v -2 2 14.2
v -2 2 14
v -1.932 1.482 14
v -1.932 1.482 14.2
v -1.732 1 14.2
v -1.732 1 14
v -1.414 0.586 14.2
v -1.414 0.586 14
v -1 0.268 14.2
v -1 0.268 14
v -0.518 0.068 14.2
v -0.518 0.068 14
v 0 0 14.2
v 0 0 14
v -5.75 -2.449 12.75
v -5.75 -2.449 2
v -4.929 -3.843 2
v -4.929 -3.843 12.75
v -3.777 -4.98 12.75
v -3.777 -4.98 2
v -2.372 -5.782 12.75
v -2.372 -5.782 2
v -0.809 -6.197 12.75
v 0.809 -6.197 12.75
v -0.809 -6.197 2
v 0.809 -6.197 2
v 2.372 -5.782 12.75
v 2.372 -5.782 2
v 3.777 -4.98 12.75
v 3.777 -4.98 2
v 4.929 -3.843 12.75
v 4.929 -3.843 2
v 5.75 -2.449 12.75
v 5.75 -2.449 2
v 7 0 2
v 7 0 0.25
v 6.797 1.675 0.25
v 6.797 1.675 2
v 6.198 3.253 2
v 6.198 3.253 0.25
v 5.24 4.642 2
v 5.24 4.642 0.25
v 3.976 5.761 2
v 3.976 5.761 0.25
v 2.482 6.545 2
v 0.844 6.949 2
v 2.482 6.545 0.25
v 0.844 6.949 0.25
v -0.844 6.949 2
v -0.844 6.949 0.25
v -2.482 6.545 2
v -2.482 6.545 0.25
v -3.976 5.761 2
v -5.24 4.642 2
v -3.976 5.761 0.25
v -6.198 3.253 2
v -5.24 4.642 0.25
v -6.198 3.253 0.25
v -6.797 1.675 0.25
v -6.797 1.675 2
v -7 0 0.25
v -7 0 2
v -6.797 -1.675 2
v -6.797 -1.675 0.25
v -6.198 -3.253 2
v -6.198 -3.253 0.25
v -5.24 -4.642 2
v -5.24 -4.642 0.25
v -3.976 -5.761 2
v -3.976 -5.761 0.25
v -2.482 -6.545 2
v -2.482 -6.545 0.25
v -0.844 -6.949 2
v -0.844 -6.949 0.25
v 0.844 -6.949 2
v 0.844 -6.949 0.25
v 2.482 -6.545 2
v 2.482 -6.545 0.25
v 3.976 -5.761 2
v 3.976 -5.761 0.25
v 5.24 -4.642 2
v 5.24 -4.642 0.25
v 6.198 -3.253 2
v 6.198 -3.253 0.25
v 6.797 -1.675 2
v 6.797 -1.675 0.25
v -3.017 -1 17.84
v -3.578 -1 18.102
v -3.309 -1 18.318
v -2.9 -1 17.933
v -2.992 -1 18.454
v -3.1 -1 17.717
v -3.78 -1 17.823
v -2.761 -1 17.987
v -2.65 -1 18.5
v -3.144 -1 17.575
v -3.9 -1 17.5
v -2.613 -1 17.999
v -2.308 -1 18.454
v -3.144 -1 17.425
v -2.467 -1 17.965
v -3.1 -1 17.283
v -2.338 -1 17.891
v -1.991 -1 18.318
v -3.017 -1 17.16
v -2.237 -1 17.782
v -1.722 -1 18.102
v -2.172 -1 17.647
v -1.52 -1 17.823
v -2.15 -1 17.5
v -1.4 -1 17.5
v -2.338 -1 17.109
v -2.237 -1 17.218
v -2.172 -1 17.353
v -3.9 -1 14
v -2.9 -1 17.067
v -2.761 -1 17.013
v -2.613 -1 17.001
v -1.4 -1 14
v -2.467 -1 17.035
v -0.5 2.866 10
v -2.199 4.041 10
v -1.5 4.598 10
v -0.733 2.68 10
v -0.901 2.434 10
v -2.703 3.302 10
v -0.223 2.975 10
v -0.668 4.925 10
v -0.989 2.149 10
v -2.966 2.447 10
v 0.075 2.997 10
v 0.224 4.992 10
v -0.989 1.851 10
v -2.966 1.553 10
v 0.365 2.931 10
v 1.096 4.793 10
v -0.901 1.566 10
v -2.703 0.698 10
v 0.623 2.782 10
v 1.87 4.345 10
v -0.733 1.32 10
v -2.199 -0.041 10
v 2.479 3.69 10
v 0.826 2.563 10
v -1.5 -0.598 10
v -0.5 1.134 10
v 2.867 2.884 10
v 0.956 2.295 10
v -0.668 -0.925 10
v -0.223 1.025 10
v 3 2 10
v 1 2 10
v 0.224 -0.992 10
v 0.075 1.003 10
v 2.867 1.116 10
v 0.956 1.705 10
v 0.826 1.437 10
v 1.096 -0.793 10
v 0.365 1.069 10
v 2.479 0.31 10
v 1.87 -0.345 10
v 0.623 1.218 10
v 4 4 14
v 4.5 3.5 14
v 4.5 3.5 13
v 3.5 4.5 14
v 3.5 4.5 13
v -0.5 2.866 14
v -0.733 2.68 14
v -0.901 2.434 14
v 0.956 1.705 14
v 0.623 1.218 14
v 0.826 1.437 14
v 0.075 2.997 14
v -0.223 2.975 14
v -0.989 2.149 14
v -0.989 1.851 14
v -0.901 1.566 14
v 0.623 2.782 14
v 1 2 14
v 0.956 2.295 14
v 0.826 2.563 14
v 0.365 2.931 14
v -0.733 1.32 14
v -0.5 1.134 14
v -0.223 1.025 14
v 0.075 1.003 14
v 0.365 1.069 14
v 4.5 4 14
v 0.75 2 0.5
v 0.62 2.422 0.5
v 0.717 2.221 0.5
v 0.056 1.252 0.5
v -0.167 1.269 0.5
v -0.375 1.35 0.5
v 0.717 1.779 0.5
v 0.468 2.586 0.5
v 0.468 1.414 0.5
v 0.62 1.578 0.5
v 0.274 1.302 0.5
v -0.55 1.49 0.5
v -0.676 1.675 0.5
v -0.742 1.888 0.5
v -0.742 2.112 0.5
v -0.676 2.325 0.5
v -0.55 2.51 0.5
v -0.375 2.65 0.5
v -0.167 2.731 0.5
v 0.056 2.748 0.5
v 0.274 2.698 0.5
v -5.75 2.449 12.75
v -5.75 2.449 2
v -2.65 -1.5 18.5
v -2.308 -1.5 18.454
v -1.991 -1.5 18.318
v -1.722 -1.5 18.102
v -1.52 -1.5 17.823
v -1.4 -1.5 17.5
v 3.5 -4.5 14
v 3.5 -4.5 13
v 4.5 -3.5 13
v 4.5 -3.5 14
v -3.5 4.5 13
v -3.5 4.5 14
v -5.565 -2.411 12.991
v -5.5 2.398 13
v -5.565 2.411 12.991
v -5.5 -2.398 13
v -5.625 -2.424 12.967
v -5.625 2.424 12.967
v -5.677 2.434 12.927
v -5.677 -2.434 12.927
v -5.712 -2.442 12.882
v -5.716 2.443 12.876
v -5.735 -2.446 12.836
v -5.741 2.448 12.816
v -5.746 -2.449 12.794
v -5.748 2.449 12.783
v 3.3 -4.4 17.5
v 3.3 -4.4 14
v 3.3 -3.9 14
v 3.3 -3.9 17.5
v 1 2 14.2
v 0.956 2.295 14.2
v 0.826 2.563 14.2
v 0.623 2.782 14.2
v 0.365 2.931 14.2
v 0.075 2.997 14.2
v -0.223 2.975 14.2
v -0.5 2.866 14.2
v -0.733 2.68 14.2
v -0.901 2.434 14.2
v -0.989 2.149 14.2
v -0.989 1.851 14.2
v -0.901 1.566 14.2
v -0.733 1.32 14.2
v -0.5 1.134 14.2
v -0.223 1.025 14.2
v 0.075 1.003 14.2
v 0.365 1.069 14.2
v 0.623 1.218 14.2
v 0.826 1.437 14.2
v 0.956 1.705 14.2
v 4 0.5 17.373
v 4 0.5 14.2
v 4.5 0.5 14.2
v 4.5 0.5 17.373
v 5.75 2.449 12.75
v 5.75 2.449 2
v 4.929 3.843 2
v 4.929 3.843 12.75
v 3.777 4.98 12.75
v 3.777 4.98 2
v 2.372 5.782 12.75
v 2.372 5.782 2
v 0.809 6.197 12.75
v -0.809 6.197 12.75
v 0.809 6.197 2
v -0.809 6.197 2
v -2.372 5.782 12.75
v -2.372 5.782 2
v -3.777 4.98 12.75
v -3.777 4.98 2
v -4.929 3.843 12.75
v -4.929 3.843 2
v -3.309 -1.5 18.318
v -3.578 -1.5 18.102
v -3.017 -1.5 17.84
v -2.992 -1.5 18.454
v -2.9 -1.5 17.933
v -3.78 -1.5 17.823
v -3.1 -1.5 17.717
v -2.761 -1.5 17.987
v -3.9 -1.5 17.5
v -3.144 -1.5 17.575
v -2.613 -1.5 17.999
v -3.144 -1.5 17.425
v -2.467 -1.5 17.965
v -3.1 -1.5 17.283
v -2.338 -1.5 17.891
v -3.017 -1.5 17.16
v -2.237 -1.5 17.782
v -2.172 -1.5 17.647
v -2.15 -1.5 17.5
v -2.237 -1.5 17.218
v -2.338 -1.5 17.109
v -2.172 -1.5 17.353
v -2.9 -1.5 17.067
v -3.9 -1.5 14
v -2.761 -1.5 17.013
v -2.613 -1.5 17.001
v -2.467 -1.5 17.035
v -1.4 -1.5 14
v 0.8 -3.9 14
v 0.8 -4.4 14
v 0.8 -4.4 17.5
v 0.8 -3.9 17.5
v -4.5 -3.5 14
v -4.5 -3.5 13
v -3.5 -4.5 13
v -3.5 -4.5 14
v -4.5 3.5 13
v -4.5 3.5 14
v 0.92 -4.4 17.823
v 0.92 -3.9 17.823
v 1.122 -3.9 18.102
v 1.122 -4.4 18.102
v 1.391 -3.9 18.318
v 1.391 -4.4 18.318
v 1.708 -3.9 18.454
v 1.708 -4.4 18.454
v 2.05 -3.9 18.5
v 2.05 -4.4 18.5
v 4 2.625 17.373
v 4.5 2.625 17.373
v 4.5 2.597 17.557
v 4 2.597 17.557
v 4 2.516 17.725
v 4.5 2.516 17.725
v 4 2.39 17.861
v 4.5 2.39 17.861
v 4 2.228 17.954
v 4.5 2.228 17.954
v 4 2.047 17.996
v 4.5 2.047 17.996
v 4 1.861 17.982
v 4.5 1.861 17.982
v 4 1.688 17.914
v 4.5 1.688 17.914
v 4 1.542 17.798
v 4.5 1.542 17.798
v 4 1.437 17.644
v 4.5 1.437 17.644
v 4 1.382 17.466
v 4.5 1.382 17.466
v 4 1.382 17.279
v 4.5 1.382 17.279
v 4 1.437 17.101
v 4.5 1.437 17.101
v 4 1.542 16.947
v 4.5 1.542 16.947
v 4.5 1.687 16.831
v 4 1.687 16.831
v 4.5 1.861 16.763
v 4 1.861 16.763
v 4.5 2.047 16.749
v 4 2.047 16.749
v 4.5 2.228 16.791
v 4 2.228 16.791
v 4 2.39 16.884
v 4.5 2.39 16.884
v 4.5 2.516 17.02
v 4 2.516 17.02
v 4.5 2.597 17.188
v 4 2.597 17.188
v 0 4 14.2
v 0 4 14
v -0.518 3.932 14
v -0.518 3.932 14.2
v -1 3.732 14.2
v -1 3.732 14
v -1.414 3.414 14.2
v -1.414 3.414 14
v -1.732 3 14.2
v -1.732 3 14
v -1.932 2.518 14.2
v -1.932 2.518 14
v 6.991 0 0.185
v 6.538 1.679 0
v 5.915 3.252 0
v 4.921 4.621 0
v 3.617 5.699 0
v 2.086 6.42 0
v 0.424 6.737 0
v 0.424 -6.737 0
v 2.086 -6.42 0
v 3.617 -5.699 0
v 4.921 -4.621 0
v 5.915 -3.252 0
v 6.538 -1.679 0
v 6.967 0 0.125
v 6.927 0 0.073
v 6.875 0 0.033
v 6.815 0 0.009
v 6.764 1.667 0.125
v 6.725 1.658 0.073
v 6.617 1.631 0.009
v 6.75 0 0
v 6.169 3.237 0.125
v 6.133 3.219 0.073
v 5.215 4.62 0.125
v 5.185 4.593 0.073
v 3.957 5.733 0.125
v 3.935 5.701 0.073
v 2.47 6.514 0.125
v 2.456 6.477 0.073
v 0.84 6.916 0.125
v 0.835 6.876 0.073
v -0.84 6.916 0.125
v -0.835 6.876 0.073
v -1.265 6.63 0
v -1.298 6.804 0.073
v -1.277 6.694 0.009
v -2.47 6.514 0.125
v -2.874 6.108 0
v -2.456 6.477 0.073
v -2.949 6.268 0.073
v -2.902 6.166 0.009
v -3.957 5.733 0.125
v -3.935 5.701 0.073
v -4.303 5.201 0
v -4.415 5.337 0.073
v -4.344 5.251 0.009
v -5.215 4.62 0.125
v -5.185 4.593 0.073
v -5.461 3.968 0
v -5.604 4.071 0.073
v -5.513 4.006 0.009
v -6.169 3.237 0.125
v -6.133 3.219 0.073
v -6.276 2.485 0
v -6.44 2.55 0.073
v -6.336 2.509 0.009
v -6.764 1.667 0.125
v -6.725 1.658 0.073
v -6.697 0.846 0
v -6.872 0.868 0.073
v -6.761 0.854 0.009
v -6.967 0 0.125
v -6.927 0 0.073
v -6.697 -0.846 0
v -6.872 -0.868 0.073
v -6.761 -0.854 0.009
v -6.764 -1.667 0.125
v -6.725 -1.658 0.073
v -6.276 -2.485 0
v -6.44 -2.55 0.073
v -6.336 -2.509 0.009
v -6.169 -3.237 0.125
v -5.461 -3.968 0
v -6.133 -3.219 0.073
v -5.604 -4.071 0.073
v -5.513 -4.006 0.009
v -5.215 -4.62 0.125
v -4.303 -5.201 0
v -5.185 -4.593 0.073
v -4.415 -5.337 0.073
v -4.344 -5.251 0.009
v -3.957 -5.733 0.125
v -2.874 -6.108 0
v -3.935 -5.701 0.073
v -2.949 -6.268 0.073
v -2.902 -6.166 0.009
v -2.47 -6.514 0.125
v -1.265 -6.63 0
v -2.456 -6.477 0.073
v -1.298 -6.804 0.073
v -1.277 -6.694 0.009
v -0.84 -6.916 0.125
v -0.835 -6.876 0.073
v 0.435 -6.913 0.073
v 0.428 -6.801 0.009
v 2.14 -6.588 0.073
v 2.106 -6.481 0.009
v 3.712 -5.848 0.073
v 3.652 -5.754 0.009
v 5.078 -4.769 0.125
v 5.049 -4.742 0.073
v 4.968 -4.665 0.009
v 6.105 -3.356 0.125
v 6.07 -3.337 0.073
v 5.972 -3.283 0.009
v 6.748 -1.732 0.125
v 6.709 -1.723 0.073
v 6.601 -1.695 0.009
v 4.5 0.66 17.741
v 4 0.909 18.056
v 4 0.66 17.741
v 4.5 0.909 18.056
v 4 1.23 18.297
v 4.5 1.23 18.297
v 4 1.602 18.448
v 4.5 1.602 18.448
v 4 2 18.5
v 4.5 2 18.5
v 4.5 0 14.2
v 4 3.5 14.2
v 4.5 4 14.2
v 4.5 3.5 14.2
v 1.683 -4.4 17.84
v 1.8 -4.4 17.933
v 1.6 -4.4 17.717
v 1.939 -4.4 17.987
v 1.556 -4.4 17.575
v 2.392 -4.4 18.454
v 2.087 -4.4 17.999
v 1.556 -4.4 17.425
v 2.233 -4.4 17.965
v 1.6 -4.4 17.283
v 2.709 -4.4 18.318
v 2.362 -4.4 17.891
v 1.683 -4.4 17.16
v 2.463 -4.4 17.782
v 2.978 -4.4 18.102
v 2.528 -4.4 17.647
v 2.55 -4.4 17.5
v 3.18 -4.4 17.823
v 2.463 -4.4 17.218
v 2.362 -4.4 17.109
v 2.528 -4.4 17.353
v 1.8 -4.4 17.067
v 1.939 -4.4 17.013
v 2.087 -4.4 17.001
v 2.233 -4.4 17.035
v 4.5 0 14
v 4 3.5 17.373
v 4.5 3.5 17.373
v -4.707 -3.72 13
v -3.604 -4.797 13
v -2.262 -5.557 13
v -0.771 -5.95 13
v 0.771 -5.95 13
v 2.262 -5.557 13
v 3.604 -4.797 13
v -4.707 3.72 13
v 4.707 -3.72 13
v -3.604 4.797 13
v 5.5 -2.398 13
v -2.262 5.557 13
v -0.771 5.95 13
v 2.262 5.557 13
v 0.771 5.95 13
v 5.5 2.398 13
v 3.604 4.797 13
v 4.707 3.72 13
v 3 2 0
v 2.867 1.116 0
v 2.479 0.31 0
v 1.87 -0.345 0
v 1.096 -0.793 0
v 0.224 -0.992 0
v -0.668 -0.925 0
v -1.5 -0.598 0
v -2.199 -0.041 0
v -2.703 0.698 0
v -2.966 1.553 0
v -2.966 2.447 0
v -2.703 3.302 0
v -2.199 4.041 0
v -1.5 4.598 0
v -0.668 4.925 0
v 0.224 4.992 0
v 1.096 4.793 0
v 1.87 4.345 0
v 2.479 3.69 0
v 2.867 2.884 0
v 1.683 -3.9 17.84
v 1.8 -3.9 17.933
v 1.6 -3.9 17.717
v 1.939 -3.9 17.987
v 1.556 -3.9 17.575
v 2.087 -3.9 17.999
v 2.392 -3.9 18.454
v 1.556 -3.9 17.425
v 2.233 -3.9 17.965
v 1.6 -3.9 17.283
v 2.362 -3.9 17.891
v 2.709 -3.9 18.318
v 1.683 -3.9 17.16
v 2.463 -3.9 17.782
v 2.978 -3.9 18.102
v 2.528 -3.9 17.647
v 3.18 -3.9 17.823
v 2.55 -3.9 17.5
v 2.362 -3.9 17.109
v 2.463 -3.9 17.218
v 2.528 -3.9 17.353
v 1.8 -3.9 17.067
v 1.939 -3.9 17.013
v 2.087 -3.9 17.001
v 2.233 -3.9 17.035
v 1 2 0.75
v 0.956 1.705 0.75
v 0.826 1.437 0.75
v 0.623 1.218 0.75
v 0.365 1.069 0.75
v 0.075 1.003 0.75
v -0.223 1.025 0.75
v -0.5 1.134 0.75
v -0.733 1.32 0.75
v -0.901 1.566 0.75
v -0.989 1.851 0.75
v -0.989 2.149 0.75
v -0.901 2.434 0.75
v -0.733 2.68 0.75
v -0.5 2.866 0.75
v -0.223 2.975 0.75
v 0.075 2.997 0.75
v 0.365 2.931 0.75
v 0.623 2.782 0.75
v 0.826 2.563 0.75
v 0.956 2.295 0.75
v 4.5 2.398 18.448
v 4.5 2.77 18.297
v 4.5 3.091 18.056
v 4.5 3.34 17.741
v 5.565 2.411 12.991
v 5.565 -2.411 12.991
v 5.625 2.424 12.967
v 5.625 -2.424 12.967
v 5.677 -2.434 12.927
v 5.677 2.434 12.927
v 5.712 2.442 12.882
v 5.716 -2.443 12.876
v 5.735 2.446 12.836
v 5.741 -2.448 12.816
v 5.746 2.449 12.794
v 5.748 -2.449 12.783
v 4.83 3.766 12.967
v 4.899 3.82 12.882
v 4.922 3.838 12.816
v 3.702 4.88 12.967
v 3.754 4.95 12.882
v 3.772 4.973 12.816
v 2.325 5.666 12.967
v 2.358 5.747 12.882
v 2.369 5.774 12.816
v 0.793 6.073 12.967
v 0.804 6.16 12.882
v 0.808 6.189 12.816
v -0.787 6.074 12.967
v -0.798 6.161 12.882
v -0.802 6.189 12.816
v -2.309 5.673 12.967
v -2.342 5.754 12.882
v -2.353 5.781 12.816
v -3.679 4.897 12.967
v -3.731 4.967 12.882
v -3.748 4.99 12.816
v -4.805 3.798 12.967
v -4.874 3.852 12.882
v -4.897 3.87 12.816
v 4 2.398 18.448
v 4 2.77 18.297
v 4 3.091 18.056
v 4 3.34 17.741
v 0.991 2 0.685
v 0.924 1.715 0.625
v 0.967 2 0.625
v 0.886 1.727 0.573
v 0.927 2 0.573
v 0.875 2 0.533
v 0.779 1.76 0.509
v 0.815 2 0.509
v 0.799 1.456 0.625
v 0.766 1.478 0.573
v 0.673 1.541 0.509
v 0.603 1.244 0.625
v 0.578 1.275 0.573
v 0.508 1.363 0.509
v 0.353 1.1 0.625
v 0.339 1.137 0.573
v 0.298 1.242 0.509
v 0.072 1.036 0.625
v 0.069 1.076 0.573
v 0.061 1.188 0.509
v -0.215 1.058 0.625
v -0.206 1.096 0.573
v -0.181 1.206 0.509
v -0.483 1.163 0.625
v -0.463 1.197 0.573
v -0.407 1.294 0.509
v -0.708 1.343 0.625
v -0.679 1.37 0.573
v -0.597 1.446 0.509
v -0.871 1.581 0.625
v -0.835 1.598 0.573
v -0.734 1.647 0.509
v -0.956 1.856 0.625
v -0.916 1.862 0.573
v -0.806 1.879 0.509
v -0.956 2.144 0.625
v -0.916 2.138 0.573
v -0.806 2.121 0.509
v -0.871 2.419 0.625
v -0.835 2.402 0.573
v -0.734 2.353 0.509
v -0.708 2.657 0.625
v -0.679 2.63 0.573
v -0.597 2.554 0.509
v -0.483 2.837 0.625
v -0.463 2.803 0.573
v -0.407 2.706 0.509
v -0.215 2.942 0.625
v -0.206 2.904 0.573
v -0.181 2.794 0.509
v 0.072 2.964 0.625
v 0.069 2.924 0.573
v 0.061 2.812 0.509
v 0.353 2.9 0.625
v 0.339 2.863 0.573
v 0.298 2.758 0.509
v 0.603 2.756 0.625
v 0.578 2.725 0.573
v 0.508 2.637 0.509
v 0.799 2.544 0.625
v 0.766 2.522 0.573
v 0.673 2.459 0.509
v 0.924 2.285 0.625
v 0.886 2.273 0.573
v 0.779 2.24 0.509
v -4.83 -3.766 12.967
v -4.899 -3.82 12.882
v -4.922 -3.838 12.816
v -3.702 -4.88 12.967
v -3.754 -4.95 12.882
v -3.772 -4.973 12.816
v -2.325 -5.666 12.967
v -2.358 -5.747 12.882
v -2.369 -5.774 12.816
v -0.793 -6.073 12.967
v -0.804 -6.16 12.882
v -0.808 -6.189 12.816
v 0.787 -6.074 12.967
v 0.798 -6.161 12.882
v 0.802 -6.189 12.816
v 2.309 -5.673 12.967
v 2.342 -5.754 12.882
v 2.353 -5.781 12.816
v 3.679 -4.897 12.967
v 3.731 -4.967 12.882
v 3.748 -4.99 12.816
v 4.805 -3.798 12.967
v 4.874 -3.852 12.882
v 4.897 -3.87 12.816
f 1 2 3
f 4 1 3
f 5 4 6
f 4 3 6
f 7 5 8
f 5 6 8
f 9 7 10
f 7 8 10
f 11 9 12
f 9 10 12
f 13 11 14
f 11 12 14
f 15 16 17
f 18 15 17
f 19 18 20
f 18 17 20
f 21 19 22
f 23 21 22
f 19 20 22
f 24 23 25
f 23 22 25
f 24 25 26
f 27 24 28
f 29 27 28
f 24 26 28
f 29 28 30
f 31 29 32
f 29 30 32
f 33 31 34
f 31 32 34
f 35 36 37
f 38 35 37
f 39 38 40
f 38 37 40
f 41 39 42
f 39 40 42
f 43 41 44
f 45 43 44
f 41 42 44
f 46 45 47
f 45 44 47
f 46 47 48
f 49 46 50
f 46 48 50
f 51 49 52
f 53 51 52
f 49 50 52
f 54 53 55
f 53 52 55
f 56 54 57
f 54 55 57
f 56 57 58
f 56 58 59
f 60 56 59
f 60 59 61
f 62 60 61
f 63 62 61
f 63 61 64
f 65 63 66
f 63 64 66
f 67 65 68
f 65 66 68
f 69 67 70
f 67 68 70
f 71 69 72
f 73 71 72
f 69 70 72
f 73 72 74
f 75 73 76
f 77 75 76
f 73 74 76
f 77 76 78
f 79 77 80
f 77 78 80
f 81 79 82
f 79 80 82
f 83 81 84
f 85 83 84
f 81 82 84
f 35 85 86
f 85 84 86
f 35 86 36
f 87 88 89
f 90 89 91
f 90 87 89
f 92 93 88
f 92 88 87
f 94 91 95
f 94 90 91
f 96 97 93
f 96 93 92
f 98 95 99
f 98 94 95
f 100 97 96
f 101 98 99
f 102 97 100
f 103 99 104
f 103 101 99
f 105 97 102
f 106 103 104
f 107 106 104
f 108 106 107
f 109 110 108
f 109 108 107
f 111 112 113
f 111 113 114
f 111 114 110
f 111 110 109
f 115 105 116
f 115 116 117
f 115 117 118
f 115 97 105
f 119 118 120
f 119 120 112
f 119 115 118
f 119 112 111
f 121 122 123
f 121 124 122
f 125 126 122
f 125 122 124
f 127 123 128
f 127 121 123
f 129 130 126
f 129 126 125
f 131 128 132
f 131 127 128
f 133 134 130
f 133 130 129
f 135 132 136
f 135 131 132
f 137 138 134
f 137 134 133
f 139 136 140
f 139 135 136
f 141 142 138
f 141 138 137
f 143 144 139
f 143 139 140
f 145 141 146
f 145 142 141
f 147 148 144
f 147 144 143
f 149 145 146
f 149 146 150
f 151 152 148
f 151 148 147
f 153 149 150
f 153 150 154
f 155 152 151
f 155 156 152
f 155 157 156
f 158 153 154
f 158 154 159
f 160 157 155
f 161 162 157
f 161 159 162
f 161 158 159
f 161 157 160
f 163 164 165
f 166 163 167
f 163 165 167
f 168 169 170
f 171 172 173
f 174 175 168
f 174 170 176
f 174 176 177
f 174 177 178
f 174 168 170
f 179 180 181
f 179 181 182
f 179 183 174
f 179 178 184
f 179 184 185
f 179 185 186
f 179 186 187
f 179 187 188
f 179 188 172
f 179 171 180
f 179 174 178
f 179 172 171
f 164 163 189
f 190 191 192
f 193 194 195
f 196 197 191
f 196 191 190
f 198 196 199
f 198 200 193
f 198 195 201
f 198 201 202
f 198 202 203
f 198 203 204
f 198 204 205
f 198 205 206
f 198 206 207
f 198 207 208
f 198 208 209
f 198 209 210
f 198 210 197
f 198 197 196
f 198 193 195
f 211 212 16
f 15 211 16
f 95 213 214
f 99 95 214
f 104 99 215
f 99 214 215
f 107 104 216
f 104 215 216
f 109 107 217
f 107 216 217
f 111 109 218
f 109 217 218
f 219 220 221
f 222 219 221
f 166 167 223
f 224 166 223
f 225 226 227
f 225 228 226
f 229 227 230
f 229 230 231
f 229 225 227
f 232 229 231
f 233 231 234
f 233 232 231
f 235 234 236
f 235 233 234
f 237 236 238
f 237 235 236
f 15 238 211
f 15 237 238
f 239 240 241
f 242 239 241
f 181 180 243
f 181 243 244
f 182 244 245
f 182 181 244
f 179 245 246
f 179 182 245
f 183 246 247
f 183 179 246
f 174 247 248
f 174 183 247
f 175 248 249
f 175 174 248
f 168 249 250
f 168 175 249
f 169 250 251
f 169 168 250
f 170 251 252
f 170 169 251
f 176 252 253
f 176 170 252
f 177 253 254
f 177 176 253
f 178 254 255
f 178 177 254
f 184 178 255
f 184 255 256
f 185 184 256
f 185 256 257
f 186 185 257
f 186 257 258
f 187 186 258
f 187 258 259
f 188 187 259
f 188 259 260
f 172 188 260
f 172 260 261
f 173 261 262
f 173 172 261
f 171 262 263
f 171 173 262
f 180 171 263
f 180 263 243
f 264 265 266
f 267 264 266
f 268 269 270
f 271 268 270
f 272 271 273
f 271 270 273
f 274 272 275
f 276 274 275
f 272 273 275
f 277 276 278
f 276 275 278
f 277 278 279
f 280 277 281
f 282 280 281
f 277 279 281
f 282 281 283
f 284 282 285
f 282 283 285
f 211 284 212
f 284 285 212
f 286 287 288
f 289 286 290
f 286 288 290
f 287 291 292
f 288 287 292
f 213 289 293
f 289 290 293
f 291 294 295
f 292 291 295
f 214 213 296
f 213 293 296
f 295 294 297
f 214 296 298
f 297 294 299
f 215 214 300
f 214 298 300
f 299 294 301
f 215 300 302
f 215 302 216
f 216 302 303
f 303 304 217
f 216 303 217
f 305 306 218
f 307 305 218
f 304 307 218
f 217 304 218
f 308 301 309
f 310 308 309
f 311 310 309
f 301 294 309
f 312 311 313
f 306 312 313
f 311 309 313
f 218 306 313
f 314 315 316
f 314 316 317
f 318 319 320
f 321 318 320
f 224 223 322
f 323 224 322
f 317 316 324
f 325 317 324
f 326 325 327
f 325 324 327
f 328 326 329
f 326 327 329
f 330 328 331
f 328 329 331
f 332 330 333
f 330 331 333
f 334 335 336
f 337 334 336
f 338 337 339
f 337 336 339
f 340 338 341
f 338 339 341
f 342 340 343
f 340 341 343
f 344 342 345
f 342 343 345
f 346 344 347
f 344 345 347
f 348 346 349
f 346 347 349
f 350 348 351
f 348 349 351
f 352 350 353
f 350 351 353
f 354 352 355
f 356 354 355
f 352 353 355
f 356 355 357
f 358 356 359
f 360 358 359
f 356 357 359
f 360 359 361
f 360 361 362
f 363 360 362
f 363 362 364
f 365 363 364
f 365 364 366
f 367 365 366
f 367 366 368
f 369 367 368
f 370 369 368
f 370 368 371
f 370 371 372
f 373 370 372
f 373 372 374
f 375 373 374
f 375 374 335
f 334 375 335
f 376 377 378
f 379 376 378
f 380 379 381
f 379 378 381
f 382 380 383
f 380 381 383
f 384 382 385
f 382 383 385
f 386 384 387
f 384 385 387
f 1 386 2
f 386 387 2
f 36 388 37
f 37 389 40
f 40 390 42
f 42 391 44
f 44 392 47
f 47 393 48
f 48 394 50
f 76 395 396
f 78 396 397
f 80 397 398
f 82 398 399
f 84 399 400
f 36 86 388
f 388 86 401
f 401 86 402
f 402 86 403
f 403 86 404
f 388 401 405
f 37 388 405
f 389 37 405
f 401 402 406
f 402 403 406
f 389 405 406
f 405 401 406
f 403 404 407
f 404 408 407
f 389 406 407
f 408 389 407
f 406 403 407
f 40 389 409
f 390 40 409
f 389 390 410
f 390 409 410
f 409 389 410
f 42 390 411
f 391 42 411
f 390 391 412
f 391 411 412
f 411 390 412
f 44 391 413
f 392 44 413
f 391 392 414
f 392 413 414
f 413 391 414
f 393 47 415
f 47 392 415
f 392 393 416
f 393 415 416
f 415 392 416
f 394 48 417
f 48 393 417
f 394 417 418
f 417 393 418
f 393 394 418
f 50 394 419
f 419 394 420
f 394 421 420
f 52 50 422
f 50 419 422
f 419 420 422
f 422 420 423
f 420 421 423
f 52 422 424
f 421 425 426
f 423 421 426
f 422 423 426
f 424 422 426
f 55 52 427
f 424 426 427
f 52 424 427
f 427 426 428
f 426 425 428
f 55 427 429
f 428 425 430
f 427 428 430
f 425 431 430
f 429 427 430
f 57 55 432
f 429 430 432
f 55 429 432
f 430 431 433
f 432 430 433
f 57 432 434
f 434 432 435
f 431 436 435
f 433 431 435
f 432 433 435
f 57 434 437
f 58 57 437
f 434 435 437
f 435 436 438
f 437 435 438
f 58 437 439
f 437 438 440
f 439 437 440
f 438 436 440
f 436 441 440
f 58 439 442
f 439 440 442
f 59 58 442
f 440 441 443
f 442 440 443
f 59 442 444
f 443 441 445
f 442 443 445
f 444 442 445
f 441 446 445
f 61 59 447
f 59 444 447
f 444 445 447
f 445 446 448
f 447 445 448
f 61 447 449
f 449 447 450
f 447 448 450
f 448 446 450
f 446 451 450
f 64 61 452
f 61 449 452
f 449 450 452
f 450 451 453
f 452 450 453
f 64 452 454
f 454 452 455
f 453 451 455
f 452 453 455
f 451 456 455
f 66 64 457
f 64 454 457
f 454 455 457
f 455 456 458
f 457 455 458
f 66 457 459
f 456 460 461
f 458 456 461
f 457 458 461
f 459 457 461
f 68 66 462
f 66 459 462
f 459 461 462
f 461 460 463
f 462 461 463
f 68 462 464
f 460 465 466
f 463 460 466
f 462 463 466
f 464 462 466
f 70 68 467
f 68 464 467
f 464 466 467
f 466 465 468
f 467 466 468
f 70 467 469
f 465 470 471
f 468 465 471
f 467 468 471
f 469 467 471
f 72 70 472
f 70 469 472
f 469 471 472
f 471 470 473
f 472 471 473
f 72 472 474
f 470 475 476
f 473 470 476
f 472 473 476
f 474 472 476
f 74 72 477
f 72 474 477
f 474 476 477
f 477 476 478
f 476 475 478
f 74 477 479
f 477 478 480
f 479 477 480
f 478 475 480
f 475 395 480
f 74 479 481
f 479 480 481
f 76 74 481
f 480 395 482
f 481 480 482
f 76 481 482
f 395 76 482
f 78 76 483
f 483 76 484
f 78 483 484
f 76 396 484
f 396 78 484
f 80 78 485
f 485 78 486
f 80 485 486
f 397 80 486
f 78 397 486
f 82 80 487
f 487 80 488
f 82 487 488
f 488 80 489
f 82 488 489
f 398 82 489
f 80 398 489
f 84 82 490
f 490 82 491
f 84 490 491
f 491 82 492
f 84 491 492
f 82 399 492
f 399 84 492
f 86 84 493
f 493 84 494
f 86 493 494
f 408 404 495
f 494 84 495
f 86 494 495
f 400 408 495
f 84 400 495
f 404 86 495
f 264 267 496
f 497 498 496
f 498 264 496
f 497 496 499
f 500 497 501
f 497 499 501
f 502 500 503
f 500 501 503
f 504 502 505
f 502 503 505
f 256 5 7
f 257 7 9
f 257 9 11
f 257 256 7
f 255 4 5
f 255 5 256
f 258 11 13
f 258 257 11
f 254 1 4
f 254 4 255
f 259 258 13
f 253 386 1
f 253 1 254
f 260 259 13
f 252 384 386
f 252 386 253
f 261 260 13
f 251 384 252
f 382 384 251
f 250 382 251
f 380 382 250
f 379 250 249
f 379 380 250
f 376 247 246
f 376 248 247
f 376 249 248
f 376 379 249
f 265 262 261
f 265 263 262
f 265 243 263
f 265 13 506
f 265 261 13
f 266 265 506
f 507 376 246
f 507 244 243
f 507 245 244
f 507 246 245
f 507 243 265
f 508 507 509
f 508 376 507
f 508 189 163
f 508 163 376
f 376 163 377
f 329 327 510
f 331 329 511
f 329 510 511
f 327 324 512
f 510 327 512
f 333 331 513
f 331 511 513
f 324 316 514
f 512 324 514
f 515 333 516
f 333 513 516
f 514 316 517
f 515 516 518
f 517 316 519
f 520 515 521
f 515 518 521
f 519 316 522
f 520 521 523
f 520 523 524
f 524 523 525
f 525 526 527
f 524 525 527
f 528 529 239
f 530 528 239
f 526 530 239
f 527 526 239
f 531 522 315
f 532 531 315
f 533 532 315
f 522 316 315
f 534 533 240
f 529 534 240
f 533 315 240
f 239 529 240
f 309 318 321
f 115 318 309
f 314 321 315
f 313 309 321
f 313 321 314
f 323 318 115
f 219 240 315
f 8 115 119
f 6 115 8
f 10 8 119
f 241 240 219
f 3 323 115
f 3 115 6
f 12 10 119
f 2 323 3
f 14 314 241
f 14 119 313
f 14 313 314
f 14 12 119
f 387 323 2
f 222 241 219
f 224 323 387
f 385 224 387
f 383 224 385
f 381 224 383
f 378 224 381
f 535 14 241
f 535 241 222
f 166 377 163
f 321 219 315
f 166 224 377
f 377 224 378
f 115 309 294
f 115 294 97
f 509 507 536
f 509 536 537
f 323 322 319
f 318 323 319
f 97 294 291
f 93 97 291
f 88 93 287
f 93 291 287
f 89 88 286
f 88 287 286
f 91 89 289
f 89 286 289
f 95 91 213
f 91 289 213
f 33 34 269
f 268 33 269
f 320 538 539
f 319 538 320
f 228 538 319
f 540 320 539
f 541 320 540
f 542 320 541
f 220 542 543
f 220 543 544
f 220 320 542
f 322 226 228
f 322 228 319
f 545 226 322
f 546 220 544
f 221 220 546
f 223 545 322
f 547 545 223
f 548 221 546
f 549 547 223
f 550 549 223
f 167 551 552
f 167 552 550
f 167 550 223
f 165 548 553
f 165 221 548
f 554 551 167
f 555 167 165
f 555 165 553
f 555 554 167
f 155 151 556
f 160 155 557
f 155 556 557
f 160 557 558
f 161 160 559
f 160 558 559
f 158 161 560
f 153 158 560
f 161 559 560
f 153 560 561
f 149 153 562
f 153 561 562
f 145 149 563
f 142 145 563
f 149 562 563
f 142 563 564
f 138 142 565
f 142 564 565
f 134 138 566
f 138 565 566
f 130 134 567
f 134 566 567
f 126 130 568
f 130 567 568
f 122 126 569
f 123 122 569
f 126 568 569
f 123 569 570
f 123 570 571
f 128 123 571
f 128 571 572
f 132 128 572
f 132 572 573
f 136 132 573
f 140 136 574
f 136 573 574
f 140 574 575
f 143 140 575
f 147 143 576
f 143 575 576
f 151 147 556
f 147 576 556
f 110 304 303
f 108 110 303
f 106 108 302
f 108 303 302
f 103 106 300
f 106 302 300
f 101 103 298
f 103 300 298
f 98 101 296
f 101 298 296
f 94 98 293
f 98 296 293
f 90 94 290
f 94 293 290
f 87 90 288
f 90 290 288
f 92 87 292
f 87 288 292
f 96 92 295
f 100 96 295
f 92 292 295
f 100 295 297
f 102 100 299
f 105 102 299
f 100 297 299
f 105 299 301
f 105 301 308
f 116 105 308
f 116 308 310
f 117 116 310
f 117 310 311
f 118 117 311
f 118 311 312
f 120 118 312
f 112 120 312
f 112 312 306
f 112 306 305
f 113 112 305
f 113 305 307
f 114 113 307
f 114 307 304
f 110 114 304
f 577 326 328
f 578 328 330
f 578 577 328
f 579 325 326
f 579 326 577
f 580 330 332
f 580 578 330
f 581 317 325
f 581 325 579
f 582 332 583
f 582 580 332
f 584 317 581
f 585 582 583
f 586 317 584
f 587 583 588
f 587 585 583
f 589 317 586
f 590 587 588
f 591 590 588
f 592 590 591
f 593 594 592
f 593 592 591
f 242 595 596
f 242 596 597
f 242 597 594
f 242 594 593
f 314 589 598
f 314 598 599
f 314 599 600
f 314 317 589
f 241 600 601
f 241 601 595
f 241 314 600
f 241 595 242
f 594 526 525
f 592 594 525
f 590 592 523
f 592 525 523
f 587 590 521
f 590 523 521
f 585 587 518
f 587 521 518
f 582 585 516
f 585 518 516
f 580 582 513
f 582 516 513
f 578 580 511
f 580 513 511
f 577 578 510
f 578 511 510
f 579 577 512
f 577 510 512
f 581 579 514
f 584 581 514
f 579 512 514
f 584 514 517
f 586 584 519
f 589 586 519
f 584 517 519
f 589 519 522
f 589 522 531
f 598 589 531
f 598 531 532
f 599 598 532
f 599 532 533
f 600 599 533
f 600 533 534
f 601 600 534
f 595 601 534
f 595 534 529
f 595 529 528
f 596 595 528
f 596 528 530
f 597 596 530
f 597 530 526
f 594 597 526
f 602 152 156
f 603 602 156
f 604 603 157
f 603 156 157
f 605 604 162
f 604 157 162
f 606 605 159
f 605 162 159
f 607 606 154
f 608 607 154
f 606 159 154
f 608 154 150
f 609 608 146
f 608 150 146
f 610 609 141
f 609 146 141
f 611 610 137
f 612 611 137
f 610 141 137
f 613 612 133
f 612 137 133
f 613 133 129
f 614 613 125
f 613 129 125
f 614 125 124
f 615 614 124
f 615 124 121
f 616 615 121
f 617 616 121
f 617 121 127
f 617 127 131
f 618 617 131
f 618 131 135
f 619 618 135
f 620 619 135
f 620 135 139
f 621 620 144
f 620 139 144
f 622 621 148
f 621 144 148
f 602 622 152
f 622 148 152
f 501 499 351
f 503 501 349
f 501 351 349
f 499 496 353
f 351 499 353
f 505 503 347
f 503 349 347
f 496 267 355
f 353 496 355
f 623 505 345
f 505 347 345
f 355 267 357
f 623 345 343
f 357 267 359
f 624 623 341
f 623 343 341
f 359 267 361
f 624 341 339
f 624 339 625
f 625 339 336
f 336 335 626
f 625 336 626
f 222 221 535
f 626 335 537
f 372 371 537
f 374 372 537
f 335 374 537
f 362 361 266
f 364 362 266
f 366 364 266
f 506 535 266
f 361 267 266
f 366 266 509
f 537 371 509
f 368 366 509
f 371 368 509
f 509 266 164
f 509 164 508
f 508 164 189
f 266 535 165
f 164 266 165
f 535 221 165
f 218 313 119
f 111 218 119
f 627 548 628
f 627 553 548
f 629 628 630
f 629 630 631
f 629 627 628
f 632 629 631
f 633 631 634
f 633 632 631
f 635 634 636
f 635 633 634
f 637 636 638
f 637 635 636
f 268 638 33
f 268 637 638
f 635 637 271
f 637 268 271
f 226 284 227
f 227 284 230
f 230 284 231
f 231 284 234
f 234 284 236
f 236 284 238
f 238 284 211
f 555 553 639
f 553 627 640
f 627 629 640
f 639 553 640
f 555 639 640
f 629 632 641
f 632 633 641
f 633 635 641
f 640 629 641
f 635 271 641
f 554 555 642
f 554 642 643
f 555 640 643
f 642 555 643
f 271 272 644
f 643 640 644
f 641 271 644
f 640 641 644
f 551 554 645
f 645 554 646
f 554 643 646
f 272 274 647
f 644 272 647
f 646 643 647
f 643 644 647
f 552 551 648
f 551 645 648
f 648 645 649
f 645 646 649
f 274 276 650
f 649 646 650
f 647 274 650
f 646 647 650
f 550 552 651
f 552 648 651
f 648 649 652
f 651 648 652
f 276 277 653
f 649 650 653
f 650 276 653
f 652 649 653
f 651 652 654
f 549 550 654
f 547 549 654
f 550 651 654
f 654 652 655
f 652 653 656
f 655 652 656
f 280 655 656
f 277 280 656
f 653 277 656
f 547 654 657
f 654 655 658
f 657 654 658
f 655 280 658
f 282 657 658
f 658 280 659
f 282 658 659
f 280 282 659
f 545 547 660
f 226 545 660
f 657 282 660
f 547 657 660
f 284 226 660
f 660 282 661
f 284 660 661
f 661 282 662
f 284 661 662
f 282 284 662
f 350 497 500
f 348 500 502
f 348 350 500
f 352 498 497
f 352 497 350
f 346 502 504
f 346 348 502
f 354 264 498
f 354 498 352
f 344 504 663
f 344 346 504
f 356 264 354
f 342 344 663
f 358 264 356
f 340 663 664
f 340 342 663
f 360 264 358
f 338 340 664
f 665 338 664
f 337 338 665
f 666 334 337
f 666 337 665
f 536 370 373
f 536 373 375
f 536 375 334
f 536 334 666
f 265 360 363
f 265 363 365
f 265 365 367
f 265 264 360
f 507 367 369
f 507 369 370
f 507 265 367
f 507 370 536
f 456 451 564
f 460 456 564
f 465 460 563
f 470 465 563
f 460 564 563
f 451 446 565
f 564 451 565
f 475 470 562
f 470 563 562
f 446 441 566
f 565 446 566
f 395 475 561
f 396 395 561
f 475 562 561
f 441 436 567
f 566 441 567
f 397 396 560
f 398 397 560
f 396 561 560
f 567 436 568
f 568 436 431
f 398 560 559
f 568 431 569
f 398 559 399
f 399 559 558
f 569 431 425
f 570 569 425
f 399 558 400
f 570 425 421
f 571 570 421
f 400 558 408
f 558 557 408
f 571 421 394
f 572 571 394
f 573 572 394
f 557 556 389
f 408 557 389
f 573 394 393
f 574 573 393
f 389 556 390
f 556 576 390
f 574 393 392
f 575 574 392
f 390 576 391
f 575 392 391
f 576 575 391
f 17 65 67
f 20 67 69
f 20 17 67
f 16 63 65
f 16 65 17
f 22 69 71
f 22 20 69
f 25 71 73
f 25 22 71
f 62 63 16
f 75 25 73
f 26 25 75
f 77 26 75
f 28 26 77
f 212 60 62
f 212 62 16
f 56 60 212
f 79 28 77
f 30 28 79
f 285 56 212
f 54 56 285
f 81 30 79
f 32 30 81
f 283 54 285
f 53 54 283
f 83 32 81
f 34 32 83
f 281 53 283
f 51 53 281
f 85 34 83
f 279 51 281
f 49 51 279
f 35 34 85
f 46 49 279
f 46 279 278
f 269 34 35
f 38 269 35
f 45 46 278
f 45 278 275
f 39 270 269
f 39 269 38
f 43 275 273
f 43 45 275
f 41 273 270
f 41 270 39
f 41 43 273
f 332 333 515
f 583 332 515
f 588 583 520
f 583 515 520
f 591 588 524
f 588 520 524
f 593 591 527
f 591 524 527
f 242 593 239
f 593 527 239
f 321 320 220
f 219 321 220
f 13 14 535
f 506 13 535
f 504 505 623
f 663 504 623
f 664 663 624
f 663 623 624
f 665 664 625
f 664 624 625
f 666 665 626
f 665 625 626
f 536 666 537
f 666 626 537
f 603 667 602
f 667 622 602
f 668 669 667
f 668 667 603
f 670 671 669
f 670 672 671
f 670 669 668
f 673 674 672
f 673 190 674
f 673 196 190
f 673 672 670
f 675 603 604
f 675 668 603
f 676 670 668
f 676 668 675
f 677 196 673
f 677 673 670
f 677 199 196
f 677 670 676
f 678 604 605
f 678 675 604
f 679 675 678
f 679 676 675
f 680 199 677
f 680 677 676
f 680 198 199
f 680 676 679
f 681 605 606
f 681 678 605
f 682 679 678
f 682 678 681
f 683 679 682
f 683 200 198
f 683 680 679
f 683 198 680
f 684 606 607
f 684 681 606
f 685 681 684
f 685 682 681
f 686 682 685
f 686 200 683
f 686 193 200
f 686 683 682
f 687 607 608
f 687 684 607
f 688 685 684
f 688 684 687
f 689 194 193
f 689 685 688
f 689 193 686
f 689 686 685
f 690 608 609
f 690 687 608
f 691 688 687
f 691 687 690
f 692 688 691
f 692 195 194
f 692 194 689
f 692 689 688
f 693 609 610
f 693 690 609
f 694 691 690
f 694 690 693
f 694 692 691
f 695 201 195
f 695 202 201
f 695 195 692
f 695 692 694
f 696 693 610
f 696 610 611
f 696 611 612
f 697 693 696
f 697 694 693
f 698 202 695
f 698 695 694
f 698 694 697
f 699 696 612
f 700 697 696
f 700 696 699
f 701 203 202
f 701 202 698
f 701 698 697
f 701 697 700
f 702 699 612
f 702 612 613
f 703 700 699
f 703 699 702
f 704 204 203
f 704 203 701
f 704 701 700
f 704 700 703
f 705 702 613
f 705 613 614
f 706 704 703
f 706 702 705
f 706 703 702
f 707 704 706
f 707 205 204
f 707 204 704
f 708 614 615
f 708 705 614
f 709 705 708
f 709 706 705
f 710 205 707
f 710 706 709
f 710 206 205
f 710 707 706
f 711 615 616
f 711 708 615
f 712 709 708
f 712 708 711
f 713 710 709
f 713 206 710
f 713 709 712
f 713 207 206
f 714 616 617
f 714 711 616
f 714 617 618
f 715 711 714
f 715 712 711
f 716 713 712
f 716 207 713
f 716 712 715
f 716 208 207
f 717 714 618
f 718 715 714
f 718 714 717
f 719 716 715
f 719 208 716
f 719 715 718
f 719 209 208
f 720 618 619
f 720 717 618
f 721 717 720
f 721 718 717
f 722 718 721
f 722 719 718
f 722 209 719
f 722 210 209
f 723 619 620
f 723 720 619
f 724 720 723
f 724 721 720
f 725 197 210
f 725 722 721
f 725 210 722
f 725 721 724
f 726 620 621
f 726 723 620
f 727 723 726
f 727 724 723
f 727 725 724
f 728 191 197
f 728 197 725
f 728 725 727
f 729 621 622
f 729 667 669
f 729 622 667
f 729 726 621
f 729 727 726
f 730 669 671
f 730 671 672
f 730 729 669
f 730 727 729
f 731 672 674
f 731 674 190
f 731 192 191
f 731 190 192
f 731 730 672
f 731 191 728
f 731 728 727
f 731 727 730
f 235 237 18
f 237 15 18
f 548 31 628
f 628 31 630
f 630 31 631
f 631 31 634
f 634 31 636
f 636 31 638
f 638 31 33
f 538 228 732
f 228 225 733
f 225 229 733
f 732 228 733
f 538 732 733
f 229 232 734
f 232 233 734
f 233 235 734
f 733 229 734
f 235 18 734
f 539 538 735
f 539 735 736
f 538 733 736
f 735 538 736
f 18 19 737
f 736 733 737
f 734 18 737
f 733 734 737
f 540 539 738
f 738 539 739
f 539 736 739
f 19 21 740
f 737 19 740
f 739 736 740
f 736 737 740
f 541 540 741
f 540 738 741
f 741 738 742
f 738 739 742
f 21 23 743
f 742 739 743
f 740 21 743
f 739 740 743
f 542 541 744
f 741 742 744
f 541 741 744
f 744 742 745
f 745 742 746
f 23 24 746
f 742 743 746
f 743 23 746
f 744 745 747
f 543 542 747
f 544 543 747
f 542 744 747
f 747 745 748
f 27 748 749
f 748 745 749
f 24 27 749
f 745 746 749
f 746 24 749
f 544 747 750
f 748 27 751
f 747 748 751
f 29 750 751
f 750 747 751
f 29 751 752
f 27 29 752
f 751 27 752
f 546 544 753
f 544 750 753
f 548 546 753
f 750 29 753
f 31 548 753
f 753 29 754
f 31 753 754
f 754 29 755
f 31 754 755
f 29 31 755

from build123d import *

# Parameters (mm, degrees)
F0_R      = 7
F1_DEPTH  = 2
F3_DEPTH  = 11
F4_R      = 3
F5_DEPTH  = 10
F7_DEPTH  = 1
F8_R      = 1
F9_DEPTH  = 0.2
F10_W     = 0.5
F10_H     = 3
F10_W_2   = 2.5
F10_H_2   = 0.5
F11_DEPTH = 4.5
F12_R     = 0.625
F13_DEPTH = 25
F14_R     = 0.5
F15_DEPTH = 11.401
F16_R     = 1
F17_DEPTH = 9.5
F18_R     = 0.25


with BuildPart() as f1:
    # F0 (on Top) → F1 (new body)
    with BuildSketch(Plane.XY):
        Circle(F0_R)
    extrude(amount=F1_DEPTH)

    # F2 (on face) → F3 (join)
    with BuildSketch(Plane.XY.offset(2)):
        with BuildLine():
            Line((-5.75, 2.44949), (-5.75, -2.44949))
            ThreePointArc((-5.75, -2.44949), (0, -6.25), (5.75, -2.44949))
            Line((5.75, -2.44949), (5.75, 2.44949))
            ThreePointArc((5.75, 2.44949), (0, 6.25), (-5.75, 2.44949))
        make_face()
    extrude(amount=F3_DEPTH)

    # F4 (on face) → F5 (cut)
    with BuildSketch(Plane(origin=(0, 0, 0), x_dir=(1, 0, 0), z_dir=(0, 0, -1))):
        with Locations((0, -2)):
            Circle(F4_R)
    extrude(amount=-F5_DEPTH, mode=Mode.SUBTRACT)

    # F6 (on face) → F7 (join)
    with BuildSketch(Plane.XY.offset(13)):
        Polygon((-3.5, -4.5), (3.5, -4.5), (4.5, -3.5), (4.5, 3.5), (3.5, 4.5), (-3.5, 4.5), (-4.5, 3.5), (-4.5, -3.5), align=None)
    extrude(amount=F7_DEPTH)

    # F8 (on face) → F9 (join)
    with BuildSketch(Plane.XY.offset(14)):
        with BuildLine():
            Line((4.5, 0), (4.5, 4))
            Line((4.5, 4), (0, 4))
            ThreePointArc((0, 4), (-1.414214, 3.414214), (-2, 2))
            ThreePointArc((-2, 2), (-1.414214, 0.585786), (0, 0))
            Line((0, 0), (4.5, 0))
        make_face()
        with Locations((0, 2)):
            Circle(F8_R, mode=Mode.SUBTRACT)
    extrude(amount=F9_DEPTH)

    # F10 (on face) → F11 (join)
    with BuildSketch(Plane.XY.offset(14)):
        with Locations((4.25, 2)):
            Rectangle(F10_W, F10_H)
        with Locations((2.05, -4.15)):
            Rectangle(F10_W_2, F10_H_2)
        with Locations((-2.65, -1.25)):
            Rectangle(F10_W_2, F10_H_2)
    extrude(amount=F11_DEPTH)

    # F12 (on face) → F13 (cut)
    with BuildSketch(Plane.YZ.offset(4.5)):
        with Locations((2, 17.372569)):
            Circle(F12_R)
        with BuildLine():
            ThreePointArc((0.5, 17.372569), (1.06177, 18.186716), (2, 18.5))
            Line((2, 18.5), (0.5, 18.5))
            Line((0.5, 18.5), (0.5, 17.372569))
        make_face()
        with BuildLine():
            ThreePointArc((2, 18.5), (2.93823, 18.186716), (3.5, 17.372569))
            Line((3.5, 17.372569), (3.5, 18.5))
            Line((3.5, 18.5), (2, 18.5))
        make_face()
    extrude(amount=-F13_DEPTH, mode=Mode.SUBTRACT)

    # F14 (on face) → F15 (cut, through all)
    with BuildSketch(Plane.XZ.offset(4.4)):
        with Locations((2.05, 17.5)):
            Circle(F14_R)
        with BuildLine():
            ThreePointArc((2.05, 18.5), (2.850391, 18.219238), (3.3, 17.5))
            Line((3.3, 17.5), (3.3, 18.5))
            Line((3.3, 18.5), (2.05, 18.5))
        make_face()
        with BuildLine():
            ThreePointArc((0.8, 17.5), (1.249609, 18.219238), (2.05, 18.5))
            Line((2.05, 18.5), (0.8, 18.5))
            Line((0.8, 18.5), (0.8, 17.5))
        make_face()
        with Locations((-2.65, 17.5)):
            Circle(F14_R)
        with BuildLine():
            Line((-3.9, 18.5), (-3.9, 17.5))
            ThreePointArc((-3.9, 17.5), (-3.450391, 18.219238), (-2.65, 18.5))
            Line((-2.65, 18.5), (-3.9, 18.5))
        make_face()
        with BuildLine():
            ThreePointArc((-2.65, 18.5), (-1.849609, 18.219238), (-1.4, 17.5))
            Line((-1.4, 17.5), (-1.4, 18.5))
            Line((-1.4, 18.5), (-2.65, 18.5))
        make_face()
    extrude(amount=-F15_DEPTH, mode=Mode.SUBTRACT)

    # F16 (on face) → F17 (join)
    with BuildSketch(Plane(origin=(0, 0, 10), x_dir=(1, 0, 0), z_dir=(0, 0, -1))):
        with Locations((0, -2)):
            Circle(F16_R)
    extrude(amount=F17_DEPTH)

    # F18
    f18_edges = [f1.edges().sort_by_distance(p)[0] for p in [
        (-1, 2, 0.5),
        (-7, 0, 0),
        (0, 6.25, 13),
        (5.75, 0, 13),
        (0, -6.25, 13),
        (-5.75, 0, 13),
    ]]
    fillet(f18_edges, radius=F18_R)


solid = f1.part
